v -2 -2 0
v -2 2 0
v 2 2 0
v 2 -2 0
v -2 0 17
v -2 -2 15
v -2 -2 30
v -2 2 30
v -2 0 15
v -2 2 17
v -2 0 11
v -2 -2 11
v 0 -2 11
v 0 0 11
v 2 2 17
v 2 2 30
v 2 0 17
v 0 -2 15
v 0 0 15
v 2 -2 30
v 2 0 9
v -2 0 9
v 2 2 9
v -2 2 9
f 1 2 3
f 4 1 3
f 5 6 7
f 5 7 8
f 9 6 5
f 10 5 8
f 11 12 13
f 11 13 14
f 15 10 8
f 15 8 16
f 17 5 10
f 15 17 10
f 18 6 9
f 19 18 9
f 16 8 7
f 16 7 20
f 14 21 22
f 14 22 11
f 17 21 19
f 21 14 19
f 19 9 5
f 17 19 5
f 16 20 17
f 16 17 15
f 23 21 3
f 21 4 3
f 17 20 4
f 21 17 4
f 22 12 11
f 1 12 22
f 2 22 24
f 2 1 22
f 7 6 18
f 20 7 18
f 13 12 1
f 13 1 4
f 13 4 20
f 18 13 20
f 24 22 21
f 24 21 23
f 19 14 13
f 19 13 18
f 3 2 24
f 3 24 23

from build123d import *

# Parameters (mm, degrees)
SKETCH_1_W          = 4
SKETCH_1_H          = 4
EXTRUDE_1_DEPTH     = 30
SKETCH_4_W          = 8
SKETCH_4_H          = 2
CUT_EXTRUDE_1_DEPTH = 4
SKETCH_6_W          = 4
SKETCH_6_H          = 2
CUT_EXTRUDE_2_DEPTH = 2


with BuildPart() as part:
    # 草圖1 → 填料-伸長1 (new body)
    with BuildSketch(Plane.XY):
        Rectangle(SKETCH_1_W, SKETCH_1_H)
    extrude(amount=EXTRUDE_1_DEPTH)

    # 草圖4 → 除料-伸長1 (cut)
    with BuildSketch(Plane.ZY.offset(2)):
        with Locations((13, 1)):
            Rectangle(SKETCH_4_W, SKETCH_4_H)
    extrude(amount=-CUT_EXTRUDE_1_DEPTH, mode=Mode.SUBTRACT)

    # 草圖6 → 除料-伸長2 (cut)
    with BuildSketch(Plane.ZY.offset(2)):
        with Locations((13, -1)):
            Rectangle(SKETCH_6_W, SKETCH_6_H)
    extrude(amount=-CUT_EXTRUDE_2_DEPTH, mode=Mode.SUBTRACT)


solid = part.part
